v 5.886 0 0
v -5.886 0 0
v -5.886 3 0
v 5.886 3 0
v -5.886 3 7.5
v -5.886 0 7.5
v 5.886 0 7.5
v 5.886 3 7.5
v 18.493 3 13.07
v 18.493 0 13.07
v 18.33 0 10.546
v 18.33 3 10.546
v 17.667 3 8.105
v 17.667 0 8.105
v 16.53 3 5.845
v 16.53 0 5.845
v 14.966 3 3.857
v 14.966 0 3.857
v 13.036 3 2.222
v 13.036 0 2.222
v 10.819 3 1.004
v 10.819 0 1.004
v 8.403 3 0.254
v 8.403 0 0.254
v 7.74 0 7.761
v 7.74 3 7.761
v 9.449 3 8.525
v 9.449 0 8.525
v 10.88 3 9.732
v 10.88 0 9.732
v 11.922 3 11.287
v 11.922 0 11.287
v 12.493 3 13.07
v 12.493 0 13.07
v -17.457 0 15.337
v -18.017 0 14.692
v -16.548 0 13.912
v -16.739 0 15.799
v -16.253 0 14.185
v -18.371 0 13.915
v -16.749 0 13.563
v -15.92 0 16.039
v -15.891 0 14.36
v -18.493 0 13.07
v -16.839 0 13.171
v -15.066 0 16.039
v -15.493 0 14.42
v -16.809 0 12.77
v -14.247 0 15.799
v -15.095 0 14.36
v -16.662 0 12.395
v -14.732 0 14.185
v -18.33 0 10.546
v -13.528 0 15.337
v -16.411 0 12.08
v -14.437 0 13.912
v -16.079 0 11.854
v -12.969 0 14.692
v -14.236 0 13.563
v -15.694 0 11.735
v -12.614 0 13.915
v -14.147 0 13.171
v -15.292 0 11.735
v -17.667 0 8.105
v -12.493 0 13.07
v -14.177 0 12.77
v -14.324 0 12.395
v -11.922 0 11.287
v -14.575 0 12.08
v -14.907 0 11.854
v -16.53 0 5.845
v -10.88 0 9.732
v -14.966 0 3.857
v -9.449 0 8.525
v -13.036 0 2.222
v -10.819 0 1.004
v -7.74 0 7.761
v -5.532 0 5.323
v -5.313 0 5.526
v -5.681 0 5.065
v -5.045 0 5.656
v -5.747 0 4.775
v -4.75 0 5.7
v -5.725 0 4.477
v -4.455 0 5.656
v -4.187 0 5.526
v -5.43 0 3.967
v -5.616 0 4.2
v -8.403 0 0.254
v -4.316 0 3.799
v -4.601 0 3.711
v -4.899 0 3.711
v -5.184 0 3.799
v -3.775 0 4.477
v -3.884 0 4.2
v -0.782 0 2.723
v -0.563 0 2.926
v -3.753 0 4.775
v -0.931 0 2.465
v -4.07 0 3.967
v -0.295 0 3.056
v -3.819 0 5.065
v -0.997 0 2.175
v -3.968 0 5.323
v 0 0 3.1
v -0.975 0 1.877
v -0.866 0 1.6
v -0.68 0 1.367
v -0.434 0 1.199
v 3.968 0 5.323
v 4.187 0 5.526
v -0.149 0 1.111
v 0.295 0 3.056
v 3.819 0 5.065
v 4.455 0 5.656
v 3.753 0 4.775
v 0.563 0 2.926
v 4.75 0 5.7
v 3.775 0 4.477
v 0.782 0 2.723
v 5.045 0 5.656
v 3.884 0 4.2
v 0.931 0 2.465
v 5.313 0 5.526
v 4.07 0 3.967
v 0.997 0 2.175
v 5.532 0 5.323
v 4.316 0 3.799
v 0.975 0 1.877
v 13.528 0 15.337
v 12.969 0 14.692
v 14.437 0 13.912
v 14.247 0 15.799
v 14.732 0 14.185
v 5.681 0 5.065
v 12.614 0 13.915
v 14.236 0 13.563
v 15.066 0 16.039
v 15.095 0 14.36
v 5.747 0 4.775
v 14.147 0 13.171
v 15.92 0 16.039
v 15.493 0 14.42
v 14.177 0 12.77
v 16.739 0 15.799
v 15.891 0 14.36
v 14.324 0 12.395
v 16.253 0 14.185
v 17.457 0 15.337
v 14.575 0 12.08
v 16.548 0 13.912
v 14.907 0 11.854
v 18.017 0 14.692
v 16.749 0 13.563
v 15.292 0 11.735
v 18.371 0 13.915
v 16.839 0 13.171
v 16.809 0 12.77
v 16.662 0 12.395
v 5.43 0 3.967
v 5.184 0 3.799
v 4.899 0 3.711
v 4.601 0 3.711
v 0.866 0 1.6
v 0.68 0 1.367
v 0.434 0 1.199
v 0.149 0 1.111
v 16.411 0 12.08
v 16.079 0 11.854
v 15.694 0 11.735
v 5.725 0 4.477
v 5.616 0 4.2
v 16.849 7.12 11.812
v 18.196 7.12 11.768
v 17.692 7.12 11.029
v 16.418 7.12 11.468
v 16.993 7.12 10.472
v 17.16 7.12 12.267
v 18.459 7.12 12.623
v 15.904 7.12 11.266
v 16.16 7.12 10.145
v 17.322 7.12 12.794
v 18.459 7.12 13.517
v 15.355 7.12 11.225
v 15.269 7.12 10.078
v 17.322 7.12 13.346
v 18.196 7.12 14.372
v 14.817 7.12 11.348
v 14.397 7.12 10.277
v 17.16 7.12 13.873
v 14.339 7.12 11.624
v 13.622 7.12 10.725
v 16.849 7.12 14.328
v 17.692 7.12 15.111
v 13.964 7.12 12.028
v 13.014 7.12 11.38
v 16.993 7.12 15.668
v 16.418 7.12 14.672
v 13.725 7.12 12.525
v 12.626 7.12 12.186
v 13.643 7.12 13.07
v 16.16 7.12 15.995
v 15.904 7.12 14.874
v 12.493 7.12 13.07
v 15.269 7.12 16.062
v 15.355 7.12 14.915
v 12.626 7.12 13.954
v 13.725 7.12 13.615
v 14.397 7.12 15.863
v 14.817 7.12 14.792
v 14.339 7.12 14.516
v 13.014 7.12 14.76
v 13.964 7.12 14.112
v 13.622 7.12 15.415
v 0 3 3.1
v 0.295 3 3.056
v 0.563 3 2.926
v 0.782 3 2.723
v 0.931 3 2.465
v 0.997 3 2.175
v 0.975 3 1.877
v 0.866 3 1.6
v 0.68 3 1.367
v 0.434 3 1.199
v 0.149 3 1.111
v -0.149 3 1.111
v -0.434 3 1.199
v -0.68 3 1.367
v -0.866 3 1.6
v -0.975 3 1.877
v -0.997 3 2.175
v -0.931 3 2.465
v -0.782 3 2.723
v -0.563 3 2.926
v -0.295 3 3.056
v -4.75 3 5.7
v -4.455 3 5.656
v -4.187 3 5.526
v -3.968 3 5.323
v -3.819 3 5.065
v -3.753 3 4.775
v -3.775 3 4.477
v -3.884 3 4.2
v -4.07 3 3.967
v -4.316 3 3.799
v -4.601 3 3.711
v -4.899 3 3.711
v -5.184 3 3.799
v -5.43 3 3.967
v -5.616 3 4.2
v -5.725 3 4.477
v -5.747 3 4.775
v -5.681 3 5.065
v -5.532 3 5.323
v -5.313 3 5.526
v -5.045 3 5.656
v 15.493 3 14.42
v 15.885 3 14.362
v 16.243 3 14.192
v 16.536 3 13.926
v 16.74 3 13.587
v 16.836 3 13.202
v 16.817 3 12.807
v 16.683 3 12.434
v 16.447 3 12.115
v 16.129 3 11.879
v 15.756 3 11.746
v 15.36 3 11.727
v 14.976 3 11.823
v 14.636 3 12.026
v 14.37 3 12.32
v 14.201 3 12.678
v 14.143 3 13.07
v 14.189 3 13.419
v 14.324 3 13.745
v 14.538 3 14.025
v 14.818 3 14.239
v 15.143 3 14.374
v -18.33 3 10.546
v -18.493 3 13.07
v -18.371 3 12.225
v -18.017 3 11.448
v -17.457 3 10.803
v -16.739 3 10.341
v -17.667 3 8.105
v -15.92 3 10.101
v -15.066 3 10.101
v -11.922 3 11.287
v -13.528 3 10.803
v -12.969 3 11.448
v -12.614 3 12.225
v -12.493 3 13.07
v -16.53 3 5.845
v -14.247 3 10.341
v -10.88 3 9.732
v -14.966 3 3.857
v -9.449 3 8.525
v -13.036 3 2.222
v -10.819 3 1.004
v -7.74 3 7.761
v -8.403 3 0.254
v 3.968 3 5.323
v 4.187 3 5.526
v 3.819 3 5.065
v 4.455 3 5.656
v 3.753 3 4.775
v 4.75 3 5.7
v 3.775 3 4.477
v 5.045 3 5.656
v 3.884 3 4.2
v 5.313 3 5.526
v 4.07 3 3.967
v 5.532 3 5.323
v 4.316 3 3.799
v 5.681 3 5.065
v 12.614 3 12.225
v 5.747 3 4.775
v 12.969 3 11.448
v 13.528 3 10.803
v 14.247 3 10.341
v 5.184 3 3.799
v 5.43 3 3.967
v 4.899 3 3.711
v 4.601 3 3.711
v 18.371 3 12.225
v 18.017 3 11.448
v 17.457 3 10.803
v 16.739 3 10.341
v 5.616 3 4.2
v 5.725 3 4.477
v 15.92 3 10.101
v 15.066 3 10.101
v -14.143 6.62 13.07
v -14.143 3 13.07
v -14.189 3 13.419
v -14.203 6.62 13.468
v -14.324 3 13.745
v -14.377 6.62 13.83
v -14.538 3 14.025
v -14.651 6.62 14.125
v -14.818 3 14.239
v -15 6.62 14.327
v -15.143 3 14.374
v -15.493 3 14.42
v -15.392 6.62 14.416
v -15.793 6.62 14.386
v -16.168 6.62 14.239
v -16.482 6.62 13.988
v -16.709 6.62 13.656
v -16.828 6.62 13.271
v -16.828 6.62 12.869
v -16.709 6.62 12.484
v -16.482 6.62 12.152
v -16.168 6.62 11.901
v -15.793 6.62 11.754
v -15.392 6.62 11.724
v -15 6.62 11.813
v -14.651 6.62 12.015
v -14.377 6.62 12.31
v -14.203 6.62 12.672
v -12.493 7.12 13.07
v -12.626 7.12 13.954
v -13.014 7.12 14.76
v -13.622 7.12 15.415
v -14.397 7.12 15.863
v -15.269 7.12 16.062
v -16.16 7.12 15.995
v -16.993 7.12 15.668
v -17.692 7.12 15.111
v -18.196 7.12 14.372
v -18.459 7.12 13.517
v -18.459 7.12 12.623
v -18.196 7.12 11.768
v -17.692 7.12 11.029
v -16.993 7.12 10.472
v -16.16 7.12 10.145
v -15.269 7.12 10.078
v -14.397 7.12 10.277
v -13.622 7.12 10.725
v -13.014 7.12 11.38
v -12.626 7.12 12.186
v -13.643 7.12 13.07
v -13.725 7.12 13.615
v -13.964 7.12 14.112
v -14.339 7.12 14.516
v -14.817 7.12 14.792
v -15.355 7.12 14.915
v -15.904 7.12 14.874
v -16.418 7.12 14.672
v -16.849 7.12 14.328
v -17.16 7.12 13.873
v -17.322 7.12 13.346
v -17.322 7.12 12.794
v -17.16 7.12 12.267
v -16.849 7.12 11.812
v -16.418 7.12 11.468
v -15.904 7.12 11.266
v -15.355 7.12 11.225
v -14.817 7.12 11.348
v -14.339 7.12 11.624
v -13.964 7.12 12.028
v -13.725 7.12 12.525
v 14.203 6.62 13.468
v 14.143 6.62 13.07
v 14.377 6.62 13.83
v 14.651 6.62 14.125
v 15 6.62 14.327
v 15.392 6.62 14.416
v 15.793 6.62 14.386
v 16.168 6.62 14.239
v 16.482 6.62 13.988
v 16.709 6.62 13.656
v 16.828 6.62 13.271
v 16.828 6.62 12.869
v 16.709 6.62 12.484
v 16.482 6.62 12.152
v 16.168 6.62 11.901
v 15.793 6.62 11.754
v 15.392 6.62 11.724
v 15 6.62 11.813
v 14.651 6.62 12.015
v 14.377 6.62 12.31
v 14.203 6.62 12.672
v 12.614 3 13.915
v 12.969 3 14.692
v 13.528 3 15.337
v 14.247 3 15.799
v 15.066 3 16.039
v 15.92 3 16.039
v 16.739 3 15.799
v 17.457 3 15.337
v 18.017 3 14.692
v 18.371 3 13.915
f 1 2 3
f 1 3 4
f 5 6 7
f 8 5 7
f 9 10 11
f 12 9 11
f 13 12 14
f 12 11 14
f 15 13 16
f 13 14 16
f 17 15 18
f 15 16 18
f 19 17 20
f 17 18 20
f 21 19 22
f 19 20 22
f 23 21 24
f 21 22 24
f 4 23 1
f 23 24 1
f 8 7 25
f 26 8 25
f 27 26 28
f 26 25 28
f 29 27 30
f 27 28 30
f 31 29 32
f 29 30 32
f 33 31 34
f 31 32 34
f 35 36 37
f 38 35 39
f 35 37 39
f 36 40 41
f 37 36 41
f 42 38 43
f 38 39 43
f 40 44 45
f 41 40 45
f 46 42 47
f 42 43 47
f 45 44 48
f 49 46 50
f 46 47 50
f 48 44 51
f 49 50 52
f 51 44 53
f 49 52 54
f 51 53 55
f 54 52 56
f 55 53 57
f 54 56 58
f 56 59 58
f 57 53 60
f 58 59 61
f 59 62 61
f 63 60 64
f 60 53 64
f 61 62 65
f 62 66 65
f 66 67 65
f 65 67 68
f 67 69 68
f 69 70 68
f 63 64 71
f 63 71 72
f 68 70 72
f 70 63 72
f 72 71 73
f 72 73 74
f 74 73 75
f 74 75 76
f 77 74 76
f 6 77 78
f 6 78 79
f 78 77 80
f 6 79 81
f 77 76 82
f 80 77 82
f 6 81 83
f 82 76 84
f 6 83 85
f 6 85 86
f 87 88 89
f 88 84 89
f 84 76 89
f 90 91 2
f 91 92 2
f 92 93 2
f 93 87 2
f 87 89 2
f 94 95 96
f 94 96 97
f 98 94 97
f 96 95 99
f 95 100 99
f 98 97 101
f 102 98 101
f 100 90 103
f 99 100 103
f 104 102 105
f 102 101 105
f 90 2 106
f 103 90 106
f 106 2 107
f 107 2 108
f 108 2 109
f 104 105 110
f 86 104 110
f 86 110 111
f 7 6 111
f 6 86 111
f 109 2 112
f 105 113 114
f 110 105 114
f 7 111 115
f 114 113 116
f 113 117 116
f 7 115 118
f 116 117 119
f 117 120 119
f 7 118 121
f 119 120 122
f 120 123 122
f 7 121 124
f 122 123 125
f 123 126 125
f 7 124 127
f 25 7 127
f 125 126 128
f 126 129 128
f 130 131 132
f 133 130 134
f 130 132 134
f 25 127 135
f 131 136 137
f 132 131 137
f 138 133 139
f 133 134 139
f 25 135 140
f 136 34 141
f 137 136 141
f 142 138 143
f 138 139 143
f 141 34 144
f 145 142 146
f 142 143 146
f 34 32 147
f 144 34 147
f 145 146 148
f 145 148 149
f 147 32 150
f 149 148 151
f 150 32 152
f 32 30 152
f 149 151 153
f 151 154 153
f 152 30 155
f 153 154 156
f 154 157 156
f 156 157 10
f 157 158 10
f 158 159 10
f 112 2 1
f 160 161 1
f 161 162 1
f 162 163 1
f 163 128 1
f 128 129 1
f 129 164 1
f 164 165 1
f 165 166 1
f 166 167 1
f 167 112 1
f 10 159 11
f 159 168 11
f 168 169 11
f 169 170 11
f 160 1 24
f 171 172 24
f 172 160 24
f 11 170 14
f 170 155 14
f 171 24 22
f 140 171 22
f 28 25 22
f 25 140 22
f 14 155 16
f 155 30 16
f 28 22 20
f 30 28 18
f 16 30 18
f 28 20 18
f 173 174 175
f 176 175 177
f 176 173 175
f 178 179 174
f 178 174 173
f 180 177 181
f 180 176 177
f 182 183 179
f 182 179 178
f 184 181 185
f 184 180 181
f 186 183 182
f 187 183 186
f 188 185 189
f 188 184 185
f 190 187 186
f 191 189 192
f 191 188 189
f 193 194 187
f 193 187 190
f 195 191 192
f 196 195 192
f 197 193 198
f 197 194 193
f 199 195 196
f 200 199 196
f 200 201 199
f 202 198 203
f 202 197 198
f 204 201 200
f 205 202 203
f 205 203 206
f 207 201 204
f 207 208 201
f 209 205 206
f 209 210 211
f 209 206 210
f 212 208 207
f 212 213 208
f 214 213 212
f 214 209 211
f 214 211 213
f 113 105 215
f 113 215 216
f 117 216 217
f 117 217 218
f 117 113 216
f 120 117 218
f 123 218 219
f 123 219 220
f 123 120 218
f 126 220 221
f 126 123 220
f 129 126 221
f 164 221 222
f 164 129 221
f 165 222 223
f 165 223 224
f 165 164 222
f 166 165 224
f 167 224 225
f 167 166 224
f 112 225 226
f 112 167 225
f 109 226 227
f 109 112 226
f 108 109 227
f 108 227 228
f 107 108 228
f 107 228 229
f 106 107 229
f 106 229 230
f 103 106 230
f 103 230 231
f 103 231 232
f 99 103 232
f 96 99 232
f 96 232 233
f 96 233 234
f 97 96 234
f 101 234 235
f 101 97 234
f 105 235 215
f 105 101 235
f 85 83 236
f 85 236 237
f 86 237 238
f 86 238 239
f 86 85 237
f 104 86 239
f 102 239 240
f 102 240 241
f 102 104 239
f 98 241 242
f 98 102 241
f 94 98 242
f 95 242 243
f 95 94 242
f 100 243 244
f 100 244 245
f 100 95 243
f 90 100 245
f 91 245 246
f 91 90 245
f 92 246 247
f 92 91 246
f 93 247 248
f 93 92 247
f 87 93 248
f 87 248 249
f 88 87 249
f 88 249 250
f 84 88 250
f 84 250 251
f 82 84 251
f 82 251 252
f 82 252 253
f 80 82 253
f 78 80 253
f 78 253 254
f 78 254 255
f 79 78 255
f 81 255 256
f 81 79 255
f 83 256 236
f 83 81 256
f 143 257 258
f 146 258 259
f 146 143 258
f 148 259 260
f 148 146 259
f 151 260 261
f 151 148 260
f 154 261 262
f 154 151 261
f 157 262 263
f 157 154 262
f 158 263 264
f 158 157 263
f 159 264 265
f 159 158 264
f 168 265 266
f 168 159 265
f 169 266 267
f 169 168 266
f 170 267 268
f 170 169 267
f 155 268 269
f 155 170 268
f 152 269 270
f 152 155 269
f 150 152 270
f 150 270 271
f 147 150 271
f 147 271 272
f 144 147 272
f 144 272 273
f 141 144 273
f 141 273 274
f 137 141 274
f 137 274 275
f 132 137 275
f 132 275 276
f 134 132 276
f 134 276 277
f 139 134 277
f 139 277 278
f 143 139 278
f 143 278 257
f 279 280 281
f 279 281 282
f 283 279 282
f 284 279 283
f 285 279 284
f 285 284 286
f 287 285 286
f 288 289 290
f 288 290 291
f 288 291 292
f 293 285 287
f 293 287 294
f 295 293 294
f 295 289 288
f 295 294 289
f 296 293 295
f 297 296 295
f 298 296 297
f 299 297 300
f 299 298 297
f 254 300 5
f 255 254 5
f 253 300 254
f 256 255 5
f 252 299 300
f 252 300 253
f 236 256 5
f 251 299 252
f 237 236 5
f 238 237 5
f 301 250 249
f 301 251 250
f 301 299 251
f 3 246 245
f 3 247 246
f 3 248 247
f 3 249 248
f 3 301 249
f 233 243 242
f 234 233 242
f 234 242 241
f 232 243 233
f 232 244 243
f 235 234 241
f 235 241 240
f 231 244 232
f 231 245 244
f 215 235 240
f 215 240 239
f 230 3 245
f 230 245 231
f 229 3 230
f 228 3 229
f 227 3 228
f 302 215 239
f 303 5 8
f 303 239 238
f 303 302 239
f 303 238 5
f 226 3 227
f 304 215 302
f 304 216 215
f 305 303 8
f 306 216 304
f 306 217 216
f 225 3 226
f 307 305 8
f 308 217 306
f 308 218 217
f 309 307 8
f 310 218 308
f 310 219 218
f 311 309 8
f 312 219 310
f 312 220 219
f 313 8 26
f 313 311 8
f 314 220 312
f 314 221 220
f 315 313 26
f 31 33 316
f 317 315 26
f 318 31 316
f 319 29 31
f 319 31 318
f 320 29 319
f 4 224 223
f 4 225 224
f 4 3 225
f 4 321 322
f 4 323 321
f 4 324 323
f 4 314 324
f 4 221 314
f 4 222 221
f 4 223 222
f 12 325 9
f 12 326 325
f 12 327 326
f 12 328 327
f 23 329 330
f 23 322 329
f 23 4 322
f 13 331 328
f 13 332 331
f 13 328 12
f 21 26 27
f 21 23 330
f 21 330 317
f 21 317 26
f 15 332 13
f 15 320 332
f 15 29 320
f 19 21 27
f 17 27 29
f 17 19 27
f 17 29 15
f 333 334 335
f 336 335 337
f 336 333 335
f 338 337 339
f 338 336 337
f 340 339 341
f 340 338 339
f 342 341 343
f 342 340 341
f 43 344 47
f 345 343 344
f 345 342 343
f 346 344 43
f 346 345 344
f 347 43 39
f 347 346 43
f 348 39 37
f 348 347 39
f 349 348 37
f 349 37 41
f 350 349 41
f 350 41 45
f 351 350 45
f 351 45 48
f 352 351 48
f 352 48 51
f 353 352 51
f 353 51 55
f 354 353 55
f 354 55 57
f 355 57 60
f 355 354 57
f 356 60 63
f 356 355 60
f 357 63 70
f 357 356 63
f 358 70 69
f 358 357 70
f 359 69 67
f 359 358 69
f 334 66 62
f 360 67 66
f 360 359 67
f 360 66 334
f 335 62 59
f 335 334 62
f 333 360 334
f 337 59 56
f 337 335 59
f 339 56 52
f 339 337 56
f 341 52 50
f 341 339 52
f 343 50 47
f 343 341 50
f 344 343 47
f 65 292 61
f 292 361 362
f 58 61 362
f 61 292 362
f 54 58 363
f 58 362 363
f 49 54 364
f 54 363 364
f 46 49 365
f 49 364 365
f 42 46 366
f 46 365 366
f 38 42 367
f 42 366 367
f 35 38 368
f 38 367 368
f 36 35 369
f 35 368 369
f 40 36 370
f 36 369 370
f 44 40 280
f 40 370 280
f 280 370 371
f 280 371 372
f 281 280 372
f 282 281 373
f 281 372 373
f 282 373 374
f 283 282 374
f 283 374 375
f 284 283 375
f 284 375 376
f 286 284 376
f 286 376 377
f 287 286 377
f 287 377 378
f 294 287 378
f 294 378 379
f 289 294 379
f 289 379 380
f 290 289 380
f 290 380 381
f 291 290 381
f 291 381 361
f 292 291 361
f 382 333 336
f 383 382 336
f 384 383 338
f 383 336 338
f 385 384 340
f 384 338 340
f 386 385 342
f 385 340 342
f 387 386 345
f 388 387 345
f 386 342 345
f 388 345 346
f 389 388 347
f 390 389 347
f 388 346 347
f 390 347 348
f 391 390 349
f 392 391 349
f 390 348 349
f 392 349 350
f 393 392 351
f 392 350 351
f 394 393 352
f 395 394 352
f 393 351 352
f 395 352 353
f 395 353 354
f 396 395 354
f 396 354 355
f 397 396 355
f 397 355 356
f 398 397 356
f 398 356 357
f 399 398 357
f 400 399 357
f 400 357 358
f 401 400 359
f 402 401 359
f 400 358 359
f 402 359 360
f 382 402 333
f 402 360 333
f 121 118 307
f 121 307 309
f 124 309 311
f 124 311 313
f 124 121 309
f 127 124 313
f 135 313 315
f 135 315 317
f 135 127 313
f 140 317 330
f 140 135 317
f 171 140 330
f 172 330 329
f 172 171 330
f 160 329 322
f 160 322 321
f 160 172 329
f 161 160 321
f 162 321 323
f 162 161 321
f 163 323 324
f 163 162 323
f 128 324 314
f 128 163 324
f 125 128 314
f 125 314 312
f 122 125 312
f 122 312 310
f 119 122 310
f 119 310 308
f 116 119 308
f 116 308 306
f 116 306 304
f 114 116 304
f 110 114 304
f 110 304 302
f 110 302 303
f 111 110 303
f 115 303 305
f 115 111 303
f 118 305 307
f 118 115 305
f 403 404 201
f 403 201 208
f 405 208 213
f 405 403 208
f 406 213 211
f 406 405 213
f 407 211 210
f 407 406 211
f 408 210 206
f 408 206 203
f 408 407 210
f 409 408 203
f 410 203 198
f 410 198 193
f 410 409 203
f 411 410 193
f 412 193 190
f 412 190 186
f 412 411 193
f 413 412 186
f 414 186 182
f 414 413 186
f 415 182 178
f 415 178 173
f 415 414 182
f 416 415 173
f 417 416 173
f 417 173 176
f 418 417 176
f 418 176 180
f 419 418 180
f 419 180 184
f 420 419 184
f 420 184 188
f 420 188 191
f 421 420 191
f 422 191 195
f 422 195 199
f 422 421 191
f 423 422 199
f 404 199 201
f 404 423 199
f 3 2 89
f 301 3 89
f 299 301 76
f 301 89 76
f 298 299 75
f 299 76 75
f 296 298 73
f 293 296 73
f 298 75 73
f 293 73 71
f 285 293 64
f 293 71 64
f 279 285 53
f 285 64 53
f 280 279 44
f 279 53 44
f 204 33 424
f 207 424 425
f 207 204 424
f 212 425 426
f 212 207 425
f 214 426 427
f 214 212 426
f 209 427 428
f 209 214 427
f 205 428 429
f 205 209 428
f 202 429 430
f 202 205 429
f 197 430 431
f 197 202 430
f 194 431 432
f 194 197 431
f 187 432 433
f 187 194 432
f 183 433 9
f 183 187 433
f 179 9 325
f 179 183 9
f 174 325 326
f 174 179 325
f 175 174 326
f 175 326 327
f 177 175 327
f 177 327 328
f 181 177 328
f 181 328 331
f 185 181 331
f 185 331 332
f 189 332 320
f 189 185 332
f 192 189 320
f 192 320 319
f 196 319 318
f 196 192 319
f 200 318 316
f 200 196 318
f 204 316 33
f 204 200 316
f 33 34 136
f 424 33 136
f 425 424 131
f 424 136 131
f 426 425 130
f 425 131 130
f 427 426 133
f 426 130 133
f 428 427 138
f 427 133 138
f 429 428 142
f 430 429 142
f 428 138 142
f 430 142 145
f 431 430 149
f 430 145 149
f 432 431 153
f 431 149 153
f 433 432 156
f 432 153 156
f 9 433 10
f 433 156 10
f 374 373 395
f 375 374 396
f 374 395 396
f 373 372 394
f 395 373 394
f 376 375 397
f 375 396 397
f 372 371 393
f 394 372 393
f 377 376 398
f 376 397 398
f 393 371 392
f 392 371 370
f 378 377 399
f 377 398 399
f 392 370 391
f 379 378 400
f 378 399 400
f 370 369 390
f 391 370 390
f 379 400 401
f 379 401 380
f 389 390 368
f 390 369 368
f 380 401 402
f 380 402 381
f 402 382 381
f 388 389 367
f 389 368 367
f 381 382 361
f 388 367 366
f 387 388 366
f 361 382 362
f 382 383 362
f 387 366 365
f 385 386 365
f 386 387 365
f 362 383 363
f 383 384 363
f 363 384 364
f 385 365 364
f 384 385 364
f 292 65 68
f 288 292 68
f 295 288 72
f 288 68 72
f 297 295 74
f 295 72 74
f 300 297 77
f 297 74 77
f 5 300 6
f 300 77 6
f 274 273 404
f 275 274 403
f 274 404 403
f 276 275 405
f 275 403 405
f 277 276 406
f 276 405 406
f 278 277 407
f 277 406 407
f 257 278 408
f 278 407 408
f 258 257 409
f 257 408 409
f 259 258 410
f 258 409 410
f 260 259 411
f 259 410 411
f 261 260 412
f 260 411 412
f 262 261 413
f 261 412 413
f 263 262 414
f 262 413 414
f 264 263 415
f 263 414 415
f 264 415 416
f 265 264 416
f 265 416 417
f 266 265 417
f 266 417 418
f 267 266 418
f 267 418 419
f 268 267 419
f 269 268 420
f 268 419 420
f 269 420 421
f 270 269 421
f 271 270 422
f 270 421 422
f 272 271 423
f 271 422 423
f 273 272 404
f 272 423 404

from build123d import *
from build123d.topology import SkipClean

# Parameters (mm, degrees)
SKETCH1_W                = 11.772507028
SKETCH1_H                = 7.5
SKETCH1_R                = 1
SKETCH1_R_2              = 3
SKETCH1_R_3              = 1.35
BOSS_EXTRUDE1_DEPTH      = 3
SKETCH4_W                = 1.65
SKETCH4_H                = 4.12
CHAMFER1_SIZE            = 0.5
CHAMFER1_OF_MIRROR1_SIZE = 0.5


with BuildPart() as part:
    # Sketch1 → Boss-Extrude1 (new body)
    # profile 1 of 5: a face of its own
    with BuildSketch(Plane(origin=(0, 0, 0), x_dir=(1, 0, 0), z_dir=(0, 1, 0))):
        with BuildLine():
            Line((5.886253514, 0), (5.886253514, -7.5))
            ThreePointArc((5.886253514, -7.5), (10.206881736, -9.07831948), (12.492796705, -13.07))
            ThreePointArc((12.492796705, -13.07), (15.492796705, -10.07), (18.492796705, -13.07))
            ThreePointArc((18.492796705, -13.07), (14.965761089, -3.857208203), (5.886253514, 0))
        make_face()
    # profile 2 of 5: a face of its own
    with BuildSketch(Plane(origin=(0, 0, 0), x_dir=(1, 0, 0), z_dir=(0, 1, 0))):
        with Locations((0, -3.75)):
            Rectangle(SKETCH1_W, SKETCH1_H)
        with Locations(Location((0, -2.1, 0), (0, 0, 270))):
            Circle(SKETCH1_R, mode=Mode.SUBTRACT)
        with Locations(Location((4.75, -4.7, 0), (0, 0, 270))):
            Circle(SKETCH1_R, mode=Mode.SUBTRACT)
        with Locations(Location((-4.75, -4.7, 0), (0, 0, 270))):
            Circle(SKETCH1_R, mode=Mode.SUBTRACT)
    # profile 3 of 5: a face of its own
    with BuildSketch(Plane(origin=(0, 0, 0), x_dir=(1, 0, 0), z_dir=(0, 1, 0))):
        with BuildLine():
            ThreePointArc((-12.492796705, -13.07), (-10.206881736, -9.07831948), (-5.886253514, -7.5))
            Line((-5.886253514, -7.5), (-5.886253514, 0))
            ThreePointArc((-5.886253514, 0), (-14.965761089, -3.857208203), (-18.492796705, -13.07))
            ThreePointArc((-18.492796705, -13.07), (-15.492796705, -10.07), (-12.492796705, -13.07))
        make_face()
    # profile 4 of 5: a face of its own
    with BuildSketch(Plane(origin=(0, 0, 0), x_dir=(1, 0, 0), z_dir=(0, 1, 0))):
        with Locations((-15.492796705, -13.07)):
            Circle(SKETCH1_R_2)
        with Locations(Location((-15.492796705, -13.07, 0), (0, 0, 270))):
            Circle(SKETCH1_R_3, mode=Mode.SUBTRACT)
    # profile 5 of 5: a face of its own
    with BuildSketch(Plane(origin=(0, 0, 0), x_dir=(1, 0, 0), z_dir=(0, 1, 0))):
        with Locations((15.492796705, -13.07)):
            Circle(SKETCH1_R_2)
        with Locations(Location((15.492796705, -13.07, 0), (0, 0, 270))):
            Circle(SKETCH1_R_3, mode=Mode.SUBTRACT)
    extrude(amount=BOSS_EXTRUDE1_DEPTH)

    # Sketch4 → Revolve2 (revolve)
    with BuildSketch(Plane.XY.offset(13.07), mode=Mode.PRIVATE) as revolve2_sk:
        with Locations((-17.667796705, 5.06)):
            Rectangle(SKETCH4_W, SKETCH4_H)
    revolve2 = revolve(revolve2_sk.sketch.rotate(Axis((-15.492796705, 3, 13.07), (0, -1, 0)), 180), axis=Axis((-15.492796705, 3, 13.07), (0, -1, 0)))

    # Chamfer1
    chamfer1_edges = [part.edges().sort_by_distance(p)[0] for p in [
        (-16.842796705, 7.12, 13.07),
    ]]
    chamfer(chamfer1_edges, length=CHAMFER1_SIZE)

    # Mirror1: Revolve2 across plane
    with SkipClean():  # the faces are left unmerged after this step: merging them gives an invalid solid
        add(revolve2.mirror(Plane(origin=(0, 0, 0), x_dir=(0, 0, 1), z_dir=(1, 0, 0))))

    # Chamfer1 of Mirror1
    chamfer1_of_mirror1_edges = [part.edges().sort_by_distance(p)[0] for p in [
        (16.842796705, 7.12, 13.07),
    ]]
    chamfer(chamfer1_of_mirror1_edges, length=CHAMFER1_OF_MIRROR1_SIZE)


solid = part.part
